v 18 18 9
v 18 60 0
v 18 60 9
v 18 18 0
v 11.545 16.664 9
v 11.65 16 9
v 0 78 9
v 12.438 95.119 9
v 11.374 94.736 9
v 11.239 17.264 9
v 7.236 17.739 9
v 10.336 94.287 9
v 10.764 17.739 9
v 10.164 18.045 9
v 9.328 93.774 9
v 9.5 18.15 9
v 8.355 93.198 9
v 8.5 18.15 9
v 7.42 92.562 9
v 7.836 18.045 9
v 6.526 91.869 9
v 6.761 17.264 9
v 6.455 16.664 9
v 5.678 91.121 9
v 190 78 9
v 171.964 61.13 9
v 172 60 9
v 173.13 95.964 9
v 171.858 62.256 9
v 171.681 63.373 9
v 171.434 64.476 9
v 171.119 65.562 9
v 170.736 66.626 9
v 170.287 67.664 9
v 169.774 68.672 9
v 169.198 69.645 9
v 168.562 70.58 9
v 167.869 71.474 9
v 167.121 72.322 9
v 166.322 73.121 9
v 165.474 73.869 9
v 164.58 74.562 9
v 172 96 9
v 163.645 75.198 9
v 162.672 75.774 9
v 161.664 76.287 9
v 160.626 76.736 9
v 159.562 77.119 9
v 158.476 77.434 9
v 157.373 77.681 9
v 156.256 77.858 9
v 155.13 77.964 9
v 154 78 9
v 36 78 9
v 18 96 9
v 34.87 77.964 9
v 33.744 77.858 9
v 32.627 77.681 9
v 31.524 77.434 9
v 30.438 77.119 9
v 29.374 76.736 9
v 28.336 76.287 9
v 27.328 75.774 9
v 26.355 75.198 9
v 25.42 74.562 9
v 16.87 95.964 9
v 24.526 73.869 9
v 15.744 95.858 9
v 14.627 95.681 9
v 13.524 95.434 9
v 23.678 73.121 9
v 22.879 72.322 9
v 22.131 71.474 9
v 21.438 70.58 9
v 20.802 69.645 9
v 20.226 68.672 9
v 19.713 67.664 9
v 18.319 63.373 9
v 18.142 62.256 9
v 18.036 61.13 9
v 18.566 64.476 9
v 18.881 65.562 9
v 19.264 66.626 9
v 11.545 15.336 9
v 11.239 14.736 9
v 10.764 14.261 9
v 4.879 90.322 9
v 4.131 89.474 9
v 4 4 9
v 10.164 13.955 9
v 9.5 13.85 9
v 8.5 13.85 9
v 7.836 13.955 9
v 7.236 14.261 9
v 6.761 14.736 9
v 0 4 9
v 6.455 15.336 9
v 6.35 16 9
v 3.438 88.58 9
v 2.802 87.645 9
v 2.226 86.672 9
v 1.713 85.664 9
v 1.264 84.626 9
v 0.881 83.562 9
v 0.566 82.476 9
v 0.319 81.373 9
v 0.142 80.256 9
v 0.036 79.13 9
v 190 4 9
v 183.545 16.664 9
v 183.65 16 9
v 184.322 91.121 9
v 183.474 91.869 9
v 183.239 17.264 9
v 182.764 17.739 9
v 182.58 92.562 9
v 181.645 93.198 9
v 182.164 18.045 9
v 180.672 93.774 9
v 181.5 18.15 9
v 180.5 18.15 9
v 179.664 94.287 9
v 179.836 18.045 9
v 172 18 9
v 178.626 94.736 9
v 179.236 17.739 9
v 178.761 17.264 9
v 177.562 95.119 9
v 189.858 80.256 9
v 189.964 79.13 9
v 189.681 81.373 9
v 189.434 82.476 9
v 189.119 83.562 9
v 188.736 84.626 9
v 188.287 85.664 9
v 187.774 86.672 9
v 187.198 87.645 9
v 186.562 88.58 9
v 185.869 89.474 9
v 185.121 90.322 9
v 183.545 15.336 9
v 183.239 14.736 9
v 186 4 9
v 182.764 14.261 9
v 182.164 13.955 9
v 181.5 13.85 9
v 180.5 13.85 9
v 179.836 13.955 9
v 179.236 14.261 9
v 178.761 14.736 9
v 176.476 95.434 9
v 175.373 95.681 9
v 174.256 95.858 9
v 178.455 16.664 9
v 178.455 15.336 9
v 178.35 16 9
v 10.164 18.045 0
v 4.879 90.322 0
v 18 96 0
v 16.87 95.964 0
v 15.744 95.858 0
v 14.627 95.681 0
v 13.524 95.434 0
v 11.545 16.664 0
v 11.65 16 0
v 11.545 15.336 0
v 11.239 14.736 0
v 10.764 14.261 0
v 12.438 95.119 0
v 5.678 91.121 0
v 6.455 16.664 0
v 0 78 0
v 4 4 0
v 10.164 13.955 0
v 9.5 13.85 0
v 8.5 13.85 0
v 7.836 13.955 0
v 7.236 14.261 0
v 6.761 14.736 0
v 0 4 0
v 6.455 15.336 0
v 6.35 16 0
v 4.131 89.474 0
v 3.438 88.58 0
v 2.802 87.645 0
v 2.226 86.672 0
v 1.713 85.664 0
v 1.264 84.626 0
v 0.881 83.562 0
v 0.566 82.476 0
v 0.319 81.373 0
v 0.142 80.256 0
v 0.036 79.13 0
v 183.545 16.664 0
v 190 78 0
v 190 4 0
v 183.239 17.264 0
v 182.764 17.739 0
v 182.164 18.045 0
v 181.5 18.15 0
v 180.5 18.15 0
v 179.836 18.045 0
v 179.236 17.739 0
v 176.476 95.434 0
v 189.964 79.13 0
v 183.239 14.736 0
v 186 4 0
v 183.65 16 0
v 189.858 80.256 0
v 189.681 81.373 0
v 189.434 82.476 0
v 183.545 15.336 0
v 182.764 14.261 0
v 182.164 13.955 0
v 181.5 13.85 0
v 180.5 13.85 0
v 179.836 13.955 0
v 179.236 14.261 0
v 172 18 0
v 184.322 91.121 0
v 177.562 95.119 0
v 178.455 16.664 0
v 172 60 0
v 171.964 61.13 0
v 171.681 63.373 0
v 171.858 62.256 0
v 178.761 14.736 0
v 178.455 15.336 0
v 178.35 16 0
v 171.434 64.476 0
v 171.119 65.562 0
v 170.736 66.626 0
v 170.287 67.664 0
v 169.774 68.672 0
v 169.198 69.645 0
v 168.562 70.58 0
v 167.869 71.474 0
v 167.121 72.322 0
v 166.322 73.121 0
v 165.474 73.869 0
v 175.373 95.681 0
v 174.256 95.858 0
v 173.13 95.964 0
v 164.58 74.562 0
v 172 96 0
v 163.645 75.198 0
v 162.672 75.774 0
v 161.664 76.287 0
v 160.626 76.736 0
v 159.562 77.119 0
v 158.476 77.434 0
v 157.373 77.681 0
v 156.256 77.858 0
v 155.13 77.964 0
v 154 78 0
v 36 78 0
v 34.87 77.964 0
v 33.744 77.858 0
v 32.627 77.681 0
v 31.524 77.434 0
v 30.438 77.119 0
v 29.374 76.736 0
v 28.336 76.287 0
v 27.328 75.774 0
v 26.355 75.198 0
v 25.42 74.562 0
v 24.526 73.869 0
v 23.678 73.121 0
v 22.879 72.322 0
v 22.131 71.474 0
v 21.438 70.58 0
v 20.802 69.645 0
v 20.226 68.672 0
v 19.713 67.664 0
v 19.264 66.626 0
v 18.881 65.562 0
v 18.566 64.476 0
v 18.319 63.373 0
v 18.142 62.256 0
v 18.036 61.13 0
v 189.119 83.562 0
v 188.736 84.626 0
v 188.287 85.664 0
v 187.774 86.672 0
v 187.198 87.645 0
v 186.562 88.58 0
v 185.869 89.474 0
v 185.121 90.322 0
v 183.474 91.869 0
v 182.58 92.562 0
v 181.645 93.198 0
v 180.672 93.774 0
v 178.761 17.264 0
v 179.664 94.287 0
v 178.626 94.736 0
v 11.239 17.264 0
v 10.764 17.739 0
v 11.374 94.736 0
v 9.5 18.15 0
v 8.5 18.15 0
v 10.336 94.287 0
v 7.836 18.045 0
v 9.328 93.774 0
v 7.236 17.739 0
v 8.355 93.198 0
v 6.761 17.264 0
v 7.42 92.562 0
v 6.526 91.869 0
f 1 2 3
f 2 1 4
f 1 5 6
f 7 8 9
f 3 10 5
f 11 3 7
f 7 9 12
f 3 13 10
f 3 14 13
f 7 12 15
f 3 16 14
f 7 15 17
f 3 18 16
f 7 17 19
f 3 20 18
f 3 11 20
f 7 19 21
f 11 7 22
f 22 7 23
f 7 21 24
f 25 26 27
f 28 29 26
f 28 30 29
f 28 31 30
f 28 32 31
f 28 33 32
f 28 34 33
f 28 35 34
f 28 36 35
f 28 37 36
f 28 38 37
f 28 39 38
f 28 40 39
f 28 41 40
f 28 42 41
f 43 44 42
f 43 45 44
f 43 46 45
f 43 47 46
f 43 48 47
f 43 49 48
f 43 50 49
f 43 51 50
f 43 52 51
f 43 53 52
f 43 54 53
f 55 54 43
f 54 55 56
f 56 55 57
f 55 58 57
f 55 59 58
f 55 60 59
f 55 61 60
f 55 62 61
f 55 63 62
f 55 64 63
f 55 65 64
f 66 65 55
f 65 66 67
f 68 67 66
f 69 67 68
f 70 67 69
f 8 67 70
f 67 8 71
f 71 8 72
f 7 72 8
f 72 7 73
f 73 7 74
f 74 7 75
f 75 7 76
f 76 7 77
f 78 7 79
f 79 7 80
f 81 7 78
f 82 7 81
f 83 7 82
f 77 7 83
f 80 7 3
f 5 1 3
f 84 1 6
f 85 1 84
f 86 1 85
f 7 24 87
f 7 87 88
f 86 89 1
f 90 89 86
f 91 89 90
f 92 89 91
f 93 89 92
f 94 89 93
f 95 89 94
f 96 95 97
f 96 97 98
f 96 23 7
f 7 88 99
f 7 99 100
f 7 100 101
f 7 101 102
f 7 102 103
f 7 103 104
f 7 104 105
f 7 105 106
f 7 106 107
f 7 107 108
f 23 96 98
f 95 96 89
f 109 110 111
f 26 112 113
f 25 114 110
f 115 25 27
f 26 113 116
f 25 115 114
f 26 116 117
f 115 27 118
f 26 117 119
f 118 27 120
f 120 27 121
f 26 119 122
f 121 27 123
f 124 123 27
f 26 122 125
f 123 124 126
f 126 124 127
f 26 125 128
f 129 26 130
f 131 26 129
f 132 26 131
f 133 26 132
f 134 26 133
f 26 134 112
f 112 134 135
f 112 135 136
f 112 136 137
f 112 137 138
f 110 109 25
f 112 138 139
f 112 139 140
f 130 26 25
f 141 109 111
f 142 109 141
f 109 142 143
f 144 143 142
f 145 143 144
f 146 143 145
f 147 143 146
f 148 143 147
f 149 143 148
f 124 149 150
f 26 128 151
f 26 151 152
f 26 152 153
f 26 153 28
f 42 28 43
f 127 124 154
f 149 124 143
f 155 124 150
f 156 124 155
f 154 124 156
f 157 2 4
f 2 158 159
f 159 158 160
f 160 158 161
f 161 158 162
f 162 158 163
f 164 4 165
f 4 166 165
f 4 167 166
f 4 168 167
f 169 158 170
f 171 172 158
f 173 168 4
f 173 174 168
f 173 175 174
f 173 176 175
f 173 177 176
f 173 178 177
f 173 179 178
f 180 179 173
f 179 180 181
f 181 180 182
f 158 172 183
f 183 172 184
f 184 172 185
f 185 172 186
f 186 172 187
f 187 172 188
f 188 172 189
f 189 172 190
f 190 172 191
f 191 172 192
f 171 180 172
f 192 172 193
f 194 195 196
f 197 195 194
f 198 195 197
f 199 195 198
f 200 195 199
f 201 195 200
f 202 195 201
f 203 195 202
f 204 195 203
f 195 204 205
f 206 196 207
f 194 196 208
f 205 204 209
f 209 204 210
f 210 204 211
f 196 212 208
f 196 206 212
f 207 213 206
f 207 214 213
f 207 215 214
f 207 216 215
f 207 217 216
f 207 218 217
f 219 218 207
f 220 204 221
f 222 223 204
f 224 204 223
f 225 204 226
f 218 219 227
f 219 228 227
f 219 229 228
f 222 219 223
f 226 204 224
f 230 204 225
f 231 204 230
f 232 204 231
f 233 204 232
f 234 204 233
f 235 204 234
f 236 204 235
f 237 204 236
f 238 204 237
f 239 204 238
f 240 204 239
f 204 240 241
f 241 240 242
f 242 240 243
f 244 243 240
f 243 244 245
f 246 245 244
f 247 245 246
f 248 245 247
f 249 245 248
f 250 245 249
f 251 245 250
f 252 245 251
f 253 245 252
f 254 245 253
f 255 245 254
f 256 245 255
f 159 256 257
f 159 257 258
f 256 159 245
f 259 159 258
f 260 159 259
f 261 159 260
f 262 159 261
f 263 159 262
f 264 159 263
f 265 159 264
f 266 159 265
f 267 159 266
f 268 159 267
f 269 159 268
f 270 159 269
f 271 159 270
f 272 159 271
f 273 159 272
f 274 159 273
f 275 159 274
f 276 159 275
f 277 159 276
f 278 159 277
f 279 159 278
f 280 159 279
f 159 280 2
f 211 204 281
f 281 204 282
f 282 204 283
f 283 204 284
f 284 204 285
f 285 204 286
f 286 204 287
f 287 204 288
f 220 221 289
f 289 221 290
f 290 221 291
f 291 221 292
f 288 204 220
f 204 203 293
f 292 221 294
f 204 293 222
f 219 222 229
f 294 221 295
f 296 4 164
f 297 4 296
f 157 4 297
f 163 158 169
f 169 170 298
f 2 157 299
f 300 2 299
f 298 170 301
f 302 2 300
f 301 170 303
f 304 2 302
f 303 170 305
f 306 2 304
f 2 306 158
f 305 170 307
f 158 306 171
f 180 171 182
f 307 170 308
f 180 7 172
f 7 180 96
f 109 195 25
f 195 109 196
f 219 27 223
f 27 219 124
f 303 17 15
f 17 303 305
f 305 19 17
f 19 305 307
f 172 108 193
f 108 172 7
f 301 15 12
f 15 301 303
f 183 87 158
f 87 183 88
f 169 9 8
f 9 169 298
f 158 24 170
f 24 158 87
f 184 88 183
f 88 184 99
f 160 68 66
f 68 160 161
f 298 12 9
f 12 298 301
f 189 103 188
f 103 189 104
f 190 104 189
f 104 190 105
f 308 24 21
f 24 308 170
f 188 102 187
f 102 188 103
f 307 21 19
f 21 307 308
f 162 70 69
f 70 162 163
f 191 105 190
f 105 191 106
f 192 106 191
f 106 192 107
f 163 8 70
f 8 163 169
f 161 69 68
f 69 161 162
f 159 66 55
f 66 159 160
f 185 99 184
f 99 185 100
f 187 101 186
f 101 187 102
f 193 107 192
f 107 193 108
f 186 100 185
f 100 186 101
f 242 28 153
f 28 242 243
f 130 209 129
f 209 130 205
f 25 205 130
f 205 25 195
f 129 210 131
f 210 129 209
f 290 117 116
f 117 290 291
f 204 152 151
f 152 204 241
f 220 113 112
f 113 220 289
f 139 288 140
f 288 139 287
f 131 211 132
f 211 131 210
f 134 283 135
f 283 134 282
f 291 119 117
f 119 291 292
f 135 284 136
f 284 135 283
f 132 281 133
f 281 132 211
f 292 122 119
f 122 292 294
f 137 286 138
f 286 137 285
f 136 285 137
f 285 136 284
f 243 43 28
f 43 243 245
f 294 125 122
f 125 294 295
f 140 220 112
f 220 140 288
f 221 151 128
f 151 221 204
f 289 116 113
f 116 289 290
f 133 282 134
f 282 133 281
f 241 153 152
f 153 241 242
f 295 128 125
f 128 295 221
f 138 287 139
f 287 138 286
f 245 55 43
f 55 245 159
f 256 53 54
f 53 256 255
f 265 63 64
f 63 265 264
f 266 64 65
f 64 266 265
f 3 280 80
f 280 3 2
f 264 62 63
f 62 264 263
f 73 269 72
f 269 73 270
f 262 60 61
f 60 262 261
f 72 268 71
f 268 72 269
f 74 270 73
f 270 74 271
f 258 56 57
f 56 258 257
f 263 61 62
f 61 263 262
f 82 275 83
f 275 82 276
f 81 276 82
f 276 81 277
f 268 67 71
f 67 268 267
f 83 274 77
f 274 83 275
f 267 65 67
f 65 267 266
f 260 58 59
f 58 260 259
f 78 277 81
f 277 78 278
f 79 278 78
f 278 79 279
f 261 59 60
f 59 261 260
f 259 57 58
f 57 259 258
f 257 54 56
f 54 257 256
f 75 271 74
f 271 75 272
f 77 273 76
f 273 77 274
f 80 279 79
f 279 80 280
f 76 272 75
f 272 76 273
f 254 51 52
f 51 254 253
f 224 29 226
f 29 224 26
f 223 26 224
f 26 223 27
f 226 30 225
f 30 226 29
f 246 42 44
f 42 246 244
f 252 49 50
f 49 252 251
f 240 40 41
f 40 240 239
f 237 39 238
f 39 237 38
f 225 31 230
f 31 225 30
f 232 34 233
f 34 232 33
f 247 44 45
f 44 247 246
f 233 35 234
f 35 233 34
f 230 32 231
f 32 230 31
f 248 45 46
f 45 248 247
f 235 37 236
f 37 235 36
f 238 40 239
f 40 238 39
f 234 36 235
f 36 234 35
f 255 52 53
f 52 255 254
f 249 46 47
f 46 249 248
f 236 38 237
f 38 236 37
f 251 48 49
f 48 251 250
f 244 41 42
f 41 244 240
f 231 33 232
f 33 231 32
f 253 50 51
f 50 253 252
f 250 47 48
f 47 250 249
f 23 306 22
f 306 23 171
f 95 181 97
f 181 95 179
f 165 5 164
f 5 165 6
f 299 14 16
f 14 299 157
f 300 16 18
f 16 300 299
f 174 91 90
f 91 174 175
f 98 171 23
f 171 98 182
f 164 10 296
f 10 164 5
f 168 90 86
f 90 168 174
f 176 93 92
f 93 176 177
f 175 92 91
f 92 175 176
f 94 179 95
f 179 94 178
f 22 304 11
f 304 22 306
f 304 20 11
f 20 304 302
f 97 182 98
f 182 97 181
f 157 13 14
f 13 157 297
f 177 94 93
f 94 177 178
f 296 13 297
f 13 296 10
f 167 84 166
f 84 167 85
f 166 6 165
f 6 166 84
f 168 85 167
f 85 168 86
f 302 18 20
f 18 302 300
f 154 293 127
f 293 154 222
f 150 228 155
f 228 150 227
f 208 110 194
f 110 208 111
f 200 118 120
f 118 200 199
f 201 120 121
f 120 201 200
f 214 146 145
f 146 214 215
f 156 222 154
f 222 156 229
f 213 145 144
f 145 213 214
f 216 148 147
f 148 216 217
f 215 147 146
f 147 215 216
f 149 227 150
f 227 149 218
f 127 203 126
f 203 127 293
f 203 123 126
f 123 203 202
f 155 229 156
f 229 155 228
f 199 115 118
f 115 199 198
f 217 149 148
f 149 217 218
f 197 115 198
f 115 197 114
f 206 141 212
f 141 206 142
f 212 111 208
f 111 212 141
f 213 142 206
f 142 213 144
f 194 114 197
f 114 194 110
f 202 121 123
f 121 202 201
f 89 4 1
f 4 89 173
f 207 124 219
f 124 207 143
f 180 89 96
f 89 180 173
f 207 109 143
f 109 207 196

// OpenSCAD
span=172;
dia=18;
h=60+dia;
$fn=100;

module _handle_main()
{
  difference()
  {
    union()
    {
      // side blocks
      for(dx=[0, span])
        translate(dx*[1,0,0])
          cube([dia, h, dia/2]);
      // top holder
      translate([dia, h, 0])
        cube([span-dia, dia, dia/2]);
      // rounded edges
      for(dx=[0, span-dia])
        translate([dia+dx, h,0])
          cylinder(r=dia, h=dia/2);
    }
    for(dx=[0, span-3*dia])
      translate([2*dia+dx, h-dia, -1])
        cylinder(r=dia, h=dia/2+2);
  }
}

module _hole()
{
  hull()
    for(dx=[-0.5, 0.5])
      translate([dx, 0, -1])
        cylinder(r=(3.8+0.5)/2, h=dia/2+2, $fn=20);
}


module _handle()
{
  difference()
  {
    _handle_main();
    // left cut in
    translate([0, 0, -1])
      rotate(-45*[0, 0, 1])
        cube(dia*[1,2,1]+[0,0,2]);
    // right cut it
    translate([span+dia, 0, dia+1])
      rotate([0, 180, 45])
        cube(dia*[1,2,1]+[0,0,2]);
    // screw holes
    for(dx=[0, span])
      translate([dx+dia/2, dia-2, 0])
        _hole();
    // removing shapr edges from the bottom
    translate([-1, 0, -1])
      cube([span+dia+2, 4, dia/2+2]);
  }
}

_handle();
//_hole();
